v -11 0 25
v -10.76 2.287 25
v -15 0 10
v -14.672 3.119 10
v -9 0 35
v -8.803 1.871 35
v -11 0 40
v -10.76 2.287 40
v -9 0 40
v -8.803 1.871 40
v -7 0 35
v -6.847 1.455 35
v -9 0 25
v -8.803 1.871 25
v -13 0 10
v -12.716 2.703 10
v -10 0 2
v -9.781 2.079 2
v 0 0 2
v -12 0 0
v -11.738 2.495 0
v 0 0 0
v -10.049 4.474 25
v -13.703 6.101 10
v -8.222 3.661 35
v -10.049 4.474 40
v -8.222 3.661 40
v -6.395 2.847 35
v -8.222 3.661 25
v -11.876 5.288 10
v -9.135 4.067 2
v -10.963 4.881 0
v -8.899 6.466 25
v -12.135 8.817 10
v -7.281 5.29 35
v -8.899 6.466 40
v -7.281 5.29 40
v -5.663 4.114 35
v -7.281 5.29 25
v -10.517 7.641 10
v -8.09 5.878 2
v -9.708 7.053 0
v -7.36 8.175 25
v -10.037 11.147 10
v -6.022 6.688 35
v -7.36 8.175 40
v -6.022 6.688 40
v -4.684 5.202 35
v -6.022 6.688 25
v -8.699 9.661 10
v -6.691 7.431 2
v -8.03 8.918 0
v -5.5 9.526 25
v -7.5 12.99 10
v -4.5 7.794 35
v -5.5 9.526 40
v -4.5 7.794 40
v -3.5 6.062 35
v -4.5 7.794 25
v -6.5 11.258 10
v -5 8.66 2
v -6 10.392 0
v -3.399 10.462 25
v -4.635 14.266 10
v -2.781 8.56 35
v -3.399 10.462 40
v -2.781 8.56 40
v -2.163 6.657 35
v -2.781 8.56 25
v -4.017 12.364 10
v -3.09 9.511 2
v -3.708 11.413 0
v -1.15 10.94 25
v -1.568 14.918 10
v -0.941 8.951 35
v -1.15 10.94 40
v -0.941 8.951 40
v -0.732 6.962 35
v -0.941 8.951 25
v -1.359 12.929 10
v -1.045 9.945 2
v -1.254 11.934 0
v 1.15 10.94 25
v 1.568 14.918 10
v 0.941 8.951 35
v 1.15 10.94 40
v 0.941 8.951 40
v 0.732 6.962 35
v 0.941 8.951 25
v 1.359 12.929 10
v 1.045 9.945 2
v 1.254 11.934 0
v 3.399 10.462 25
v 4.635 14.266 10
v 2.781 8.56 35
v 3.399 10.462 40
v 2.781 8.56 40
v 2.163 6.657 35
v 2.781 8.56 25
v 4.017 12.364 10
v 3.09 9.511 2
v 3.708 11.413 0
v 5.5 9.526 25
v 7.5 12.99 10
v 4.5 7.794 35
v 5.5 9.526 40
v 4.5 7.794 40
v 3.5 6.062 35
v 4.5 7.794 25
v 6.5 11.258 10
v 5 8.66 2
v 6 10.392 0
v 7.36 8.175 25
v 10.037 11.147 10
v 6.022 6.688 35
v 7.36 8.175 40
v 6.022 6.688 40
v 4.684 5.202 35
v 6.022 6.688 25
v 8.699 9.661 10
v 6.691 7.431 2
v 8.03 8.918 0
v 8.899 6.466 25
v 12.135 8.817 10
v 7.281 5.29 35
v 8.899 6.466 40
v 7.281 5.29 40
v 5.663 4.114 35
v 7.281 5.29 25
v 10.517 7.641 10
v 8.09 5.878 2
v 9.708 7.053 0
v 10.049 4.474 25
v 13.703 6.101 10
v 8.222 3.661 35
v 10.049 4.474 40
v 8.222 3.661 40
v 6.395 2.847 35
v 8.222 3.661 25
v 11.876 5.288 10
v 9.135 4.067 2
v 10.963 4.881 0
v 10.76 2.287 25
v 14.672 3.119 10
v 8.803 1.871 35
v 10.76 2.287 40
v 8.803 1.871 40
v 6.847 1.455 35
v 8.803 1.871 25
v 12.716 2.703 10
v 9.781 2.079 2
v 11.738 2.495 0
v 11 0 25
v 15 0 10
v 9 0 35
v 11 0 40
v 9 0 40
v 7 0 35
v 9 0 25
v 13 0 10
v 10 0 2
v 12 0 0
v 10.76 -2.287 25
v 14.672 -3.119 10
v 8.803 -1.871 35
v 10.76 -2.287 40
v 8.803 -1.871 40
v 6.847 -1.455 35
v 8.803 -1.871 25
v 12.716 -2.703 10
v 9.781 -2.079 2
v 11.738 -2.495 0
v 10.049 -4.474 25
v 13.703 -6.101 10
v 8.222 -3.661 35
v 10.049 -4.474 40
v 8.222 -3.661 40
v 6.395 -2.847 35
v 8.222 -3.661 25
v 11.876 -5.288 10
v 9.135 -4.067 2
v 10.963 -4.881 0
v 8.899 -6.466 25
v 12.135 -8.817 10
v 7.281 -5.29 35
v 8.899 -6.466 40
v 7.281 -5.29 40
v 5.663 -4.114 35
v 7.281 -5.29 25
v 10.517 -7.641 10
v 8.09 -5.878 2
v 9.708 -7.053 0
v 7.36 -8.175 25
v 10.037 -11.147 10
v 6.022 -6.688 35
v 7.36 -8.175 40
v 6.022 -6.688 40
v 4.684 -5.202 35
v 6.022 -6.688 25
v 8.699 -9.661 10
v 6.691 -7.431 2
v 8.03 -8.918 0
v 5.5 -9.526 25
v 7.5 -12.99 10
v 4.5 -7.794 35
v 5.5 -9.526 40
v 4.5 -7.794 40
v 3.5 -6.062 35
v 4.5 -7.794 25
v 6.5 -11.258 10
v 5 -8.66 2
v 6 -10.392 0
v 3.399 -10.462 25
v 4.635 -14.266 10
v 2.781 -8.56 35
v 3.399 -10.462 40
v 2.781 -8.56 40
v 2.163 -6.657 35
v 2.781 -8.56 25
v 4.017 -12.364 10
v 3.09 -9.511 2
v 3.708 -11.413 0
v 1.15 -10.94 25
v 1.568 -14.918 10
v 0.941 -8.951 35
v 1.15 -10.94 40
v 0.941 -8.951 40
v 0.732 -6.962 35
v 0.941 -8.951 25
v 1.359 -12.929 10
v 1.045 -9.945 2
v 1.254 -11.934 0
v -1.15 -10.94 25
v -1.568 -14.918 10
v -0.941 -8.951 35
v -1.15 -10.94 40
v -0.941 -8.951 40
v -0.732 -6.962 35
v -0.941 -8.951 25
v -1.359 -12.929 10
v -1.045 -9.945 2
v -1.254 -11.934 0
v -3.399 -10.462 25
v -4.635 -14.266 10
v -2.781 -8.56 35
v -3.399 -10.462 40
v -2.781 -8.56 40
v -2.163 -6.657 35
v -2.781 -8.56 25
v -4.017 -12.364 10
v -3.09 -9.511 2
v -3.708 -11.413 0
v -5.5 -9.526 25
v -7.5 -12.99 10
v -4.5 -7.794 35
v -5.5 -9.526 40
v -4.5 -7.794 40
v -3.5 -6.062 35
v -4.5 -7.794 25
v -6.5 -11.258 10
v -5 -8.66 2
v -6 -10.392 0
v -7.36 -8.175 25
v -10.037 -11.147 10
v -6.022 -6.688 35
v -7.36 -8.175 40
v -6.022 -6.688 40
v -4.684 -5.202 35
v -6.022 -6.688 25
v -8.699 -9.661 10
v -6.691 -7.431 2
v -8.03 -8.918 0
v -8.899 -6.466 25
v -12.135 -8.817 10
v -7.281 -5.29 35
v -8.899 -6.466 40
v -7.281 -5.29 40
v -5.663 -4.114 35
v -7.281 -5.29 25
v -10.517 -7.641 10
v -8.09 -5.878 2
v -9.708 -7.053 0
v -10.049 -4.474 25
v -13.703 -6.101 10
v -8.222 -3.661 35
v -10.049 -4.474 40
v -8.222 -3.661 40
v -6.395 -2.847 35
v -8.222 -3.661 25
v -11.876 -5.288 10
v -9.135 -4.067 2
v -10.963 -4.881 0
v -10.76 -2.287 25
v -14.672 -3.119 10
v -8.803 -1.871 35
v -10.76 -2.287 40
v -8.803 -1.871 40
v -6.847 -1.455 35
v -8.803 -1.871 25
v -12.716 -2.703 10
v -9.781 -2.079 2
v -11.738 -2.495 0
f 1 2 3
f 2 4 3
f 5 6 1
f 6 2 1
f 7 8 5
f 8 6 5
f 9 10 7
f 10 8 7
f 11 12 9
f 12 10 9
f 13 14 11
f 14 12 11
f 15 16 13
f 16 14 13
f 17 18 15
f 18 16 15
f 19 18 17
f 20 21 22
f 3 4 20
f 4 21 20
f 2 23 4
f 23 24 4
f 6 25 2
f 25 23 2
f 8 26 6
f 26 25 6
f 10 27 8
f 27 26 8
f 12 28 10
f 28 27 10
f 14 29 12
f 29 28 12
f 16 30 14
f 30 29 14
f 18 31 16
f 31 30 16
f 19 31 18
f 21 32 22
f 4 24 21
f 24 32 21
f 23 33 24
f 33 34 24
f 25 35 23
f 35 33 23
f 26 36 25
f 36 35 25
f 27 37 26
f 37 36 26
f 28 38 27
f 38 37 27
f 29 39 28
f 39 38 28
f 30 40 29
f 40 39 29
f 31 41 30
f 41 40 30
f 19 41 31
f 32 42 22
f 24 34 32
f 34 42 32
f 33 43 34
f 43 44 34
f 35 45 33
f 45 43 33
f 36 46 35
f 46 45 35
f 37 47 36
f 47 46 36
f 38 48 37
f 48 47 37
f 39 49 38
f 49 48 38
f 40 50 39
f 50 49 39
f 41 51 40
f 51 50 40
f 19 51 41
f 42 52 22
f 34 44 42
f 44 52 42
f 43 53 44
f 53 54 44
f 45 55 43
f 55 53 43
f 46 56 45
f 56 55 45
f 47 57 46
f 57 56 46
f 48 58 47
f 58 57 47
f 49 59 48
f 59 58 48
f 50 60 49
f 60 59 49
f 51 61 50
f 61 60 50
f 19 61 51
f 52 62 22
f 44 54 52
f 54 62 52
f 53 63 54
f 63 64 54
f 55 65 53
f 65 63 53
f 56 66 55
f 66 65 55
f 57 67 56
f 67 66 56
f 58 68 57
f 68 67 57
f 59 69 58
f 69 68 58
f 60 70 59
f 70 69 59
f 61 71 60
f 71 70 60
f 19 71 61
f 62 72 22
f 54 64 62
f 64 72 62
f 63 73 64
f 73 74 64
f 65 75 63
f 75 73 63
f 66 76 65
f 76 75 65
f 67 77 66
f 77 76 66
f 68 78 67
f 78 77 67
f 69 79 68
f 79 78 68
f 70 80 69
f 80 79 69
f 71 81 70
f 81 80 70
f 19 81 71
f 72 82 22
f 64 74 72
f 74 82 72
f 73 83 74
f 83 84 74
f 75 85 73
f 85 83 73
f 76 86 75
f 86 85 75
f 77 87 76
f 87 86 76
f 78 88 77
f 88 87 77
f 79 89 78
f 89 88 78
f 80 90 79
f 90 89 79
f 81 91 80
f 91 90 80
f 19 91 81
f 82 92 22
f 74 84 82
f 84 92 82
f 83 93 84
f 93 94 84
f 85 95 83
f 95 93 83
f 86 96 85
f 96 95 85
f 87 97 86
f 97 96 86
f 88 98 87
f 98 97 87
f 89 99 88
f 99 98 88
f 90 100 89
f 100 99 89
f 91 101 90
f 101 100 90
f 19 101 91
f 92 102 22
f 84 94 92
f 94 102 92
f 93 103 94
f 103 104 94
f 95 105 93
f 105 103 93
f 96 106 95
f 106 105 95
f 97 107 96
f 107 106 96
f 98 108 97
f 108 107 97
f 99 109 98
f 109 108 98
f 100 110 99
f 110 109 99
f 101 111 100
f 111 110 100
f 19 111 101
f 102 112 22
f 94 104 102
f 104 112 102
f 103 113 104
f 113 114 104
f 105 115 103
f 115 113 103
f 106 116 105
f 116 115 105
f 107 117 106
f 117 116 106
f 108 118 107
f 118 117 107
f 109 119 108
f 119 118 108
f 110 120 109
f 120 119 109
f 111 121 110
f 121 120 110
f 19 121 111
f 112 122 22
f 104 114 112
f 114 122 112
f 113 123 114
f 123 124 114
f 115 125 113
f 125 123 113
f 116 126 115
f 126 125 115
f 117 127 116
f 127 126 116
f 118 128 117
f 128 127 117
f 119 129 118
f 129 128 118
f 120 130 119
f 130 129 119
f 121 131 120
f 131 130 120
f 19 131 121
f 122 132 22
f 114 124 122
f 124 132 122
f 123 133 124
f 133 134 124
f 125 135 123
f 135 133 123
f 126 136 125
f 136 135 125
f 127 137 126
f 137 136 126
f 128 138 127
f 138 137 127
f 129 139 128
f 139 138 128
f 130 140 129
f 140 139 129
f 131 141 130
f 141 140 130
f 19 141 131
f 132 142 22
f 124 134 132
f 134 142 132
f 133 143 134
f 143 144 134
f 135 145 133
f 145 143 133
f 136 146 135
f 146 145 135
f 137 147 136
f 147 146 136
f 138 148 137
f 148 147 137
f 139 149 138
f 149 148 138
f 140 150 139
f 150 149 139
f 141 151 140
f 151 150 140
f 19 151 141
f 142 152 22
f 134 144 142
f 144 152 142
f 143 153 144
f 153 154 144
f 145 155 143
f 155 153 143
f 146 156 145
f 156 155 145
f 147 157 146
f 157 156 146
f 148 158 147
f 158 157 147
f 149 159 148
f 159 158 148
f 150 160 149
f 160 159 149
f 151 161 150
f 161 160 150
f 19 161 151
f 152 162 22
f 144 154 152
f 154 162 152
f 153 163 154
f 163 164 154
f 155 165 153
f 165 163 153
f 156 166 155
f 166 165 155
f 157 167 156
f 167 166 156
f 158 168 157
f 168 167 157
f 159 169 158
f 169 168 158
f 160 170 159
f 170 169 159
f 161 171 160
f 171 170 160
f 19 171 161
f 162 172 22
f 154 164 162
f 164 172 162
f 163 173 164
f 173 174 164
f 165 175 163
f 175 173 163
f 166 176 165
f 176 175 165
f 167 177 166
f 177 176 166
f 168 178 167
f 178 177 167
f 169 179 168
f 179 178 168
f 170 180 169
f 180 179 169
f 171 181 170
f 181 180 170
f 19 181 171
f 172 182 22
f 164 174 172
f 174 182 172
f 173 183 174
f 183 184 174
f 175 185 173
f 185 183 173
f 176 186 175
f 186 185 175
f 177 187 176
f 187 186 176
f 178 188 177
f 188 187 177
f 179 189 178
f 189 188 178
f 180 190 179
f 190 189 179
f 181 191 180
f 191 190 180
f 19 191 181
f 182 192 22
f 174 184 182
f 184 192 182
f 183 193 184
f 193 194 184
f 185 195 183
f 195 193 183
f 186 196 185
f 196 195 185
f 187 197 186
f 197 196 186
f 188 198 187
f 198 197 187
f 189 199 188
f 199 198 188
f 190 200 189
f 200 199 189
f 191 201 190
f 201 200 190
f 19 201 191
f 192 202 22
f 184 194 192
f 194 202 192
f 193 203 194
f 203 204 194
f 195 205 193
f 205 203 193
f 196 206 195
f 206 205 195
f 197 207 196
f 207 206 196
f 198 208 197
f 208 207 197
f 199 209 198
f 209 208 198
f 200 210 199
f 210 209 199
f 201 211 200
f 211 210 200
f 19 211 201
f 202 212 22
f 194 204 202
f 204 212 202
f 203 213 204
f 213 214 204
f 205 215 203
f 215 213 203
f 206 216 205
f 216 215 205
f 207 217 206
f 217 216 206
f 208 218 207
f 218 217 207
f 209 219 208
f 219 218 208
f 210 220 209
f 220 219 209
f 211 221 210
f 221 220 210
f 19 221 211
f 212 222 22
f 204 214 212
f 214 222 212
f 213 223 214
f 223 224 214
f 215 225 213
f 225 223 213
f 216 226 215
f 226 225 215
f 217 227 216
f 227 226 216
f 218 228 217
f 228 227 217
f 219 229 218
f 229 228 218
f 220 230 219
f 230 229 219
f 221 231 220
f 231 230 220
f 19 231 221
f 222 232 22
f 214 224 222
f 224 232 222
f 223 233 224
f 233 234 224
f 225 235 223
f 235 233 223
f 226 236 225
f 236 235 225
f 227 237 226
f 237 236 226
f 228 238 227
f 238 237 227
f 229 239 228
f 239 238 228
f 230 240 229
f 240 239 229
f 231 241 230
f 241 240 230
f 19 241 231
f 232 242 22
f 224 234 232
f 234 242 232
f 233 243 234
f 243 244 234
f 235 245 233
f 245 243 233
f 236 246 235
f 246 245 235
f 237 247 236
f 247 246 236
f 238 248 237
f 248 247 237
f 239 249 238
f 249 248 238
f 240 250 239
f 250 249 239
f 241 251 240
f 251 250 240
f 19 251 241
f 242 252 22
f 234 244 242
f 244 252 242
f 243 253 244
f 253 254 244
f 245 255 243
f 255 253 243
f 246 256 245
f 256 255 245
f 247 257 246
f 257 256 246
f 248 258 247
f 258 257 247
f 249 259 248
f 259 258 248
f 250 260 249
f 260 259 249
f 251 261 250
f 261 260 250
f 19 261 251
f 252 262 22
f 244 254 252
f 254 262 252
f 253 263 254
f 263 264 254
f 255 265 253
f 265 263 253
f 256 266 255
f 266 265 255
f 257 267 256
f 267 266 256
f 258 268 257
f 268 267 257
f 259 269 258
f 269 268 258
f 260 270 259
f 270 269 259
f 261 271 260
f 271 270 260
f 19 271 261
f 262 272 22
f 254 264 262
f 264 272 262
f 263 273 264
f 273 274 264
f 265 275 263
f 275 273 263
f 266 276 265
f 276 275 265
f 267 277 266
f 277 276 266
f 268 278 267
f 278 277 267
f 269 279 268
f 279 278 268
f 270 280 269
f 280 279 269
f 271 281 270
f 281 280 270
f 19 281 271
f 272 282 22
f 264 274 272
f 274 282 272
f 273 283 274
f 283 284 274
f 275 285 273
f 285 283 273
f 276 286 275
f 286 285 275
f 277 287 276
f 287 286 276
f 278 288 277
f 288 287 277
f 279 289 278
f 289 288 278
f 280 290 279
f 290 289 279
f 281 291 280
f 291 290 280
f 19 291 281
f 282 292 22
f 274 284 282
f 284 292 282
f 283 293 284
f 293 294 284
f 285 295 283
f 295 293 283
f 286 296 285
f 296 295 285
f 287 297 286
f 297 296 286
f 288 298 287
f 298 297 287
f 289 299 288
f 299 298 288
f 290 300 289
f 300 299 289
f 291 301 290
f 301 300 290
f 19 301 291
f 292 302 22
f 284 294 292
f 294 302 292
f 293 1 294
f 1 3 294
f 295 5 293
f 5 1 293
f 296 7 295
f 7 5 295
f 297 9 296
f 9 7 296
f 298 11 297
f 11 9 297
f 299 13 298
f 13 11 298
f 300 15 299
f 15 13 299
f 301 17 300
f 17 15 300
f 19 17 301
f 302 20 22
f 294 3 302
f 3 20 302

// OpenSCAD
// Zweck: Vase als rotate_extrude eines Polygonprofils (Wand 2 mm, Boden 2 mm).
h = 40;
wall = 2;
outer = [[12, 0], [15, 10], [11, 25], [9, 35], [11, h]];
// Innenkontur: Außenkontur um die Wandstärke nach innen, von oben nach unten.
inner = [for (i = [len(outer) - 1 : -1 : 1]) [outer[i][0] - wall, max(outer[i][1], wall)]];
profile = concat([[0, 0]], outer, inner, [[outer[0][0] - wall, wall], [0, wall]]);
echo(points = len(profile), top = profile[len(outer)]);
rotate_extrude() polygon(profile);
